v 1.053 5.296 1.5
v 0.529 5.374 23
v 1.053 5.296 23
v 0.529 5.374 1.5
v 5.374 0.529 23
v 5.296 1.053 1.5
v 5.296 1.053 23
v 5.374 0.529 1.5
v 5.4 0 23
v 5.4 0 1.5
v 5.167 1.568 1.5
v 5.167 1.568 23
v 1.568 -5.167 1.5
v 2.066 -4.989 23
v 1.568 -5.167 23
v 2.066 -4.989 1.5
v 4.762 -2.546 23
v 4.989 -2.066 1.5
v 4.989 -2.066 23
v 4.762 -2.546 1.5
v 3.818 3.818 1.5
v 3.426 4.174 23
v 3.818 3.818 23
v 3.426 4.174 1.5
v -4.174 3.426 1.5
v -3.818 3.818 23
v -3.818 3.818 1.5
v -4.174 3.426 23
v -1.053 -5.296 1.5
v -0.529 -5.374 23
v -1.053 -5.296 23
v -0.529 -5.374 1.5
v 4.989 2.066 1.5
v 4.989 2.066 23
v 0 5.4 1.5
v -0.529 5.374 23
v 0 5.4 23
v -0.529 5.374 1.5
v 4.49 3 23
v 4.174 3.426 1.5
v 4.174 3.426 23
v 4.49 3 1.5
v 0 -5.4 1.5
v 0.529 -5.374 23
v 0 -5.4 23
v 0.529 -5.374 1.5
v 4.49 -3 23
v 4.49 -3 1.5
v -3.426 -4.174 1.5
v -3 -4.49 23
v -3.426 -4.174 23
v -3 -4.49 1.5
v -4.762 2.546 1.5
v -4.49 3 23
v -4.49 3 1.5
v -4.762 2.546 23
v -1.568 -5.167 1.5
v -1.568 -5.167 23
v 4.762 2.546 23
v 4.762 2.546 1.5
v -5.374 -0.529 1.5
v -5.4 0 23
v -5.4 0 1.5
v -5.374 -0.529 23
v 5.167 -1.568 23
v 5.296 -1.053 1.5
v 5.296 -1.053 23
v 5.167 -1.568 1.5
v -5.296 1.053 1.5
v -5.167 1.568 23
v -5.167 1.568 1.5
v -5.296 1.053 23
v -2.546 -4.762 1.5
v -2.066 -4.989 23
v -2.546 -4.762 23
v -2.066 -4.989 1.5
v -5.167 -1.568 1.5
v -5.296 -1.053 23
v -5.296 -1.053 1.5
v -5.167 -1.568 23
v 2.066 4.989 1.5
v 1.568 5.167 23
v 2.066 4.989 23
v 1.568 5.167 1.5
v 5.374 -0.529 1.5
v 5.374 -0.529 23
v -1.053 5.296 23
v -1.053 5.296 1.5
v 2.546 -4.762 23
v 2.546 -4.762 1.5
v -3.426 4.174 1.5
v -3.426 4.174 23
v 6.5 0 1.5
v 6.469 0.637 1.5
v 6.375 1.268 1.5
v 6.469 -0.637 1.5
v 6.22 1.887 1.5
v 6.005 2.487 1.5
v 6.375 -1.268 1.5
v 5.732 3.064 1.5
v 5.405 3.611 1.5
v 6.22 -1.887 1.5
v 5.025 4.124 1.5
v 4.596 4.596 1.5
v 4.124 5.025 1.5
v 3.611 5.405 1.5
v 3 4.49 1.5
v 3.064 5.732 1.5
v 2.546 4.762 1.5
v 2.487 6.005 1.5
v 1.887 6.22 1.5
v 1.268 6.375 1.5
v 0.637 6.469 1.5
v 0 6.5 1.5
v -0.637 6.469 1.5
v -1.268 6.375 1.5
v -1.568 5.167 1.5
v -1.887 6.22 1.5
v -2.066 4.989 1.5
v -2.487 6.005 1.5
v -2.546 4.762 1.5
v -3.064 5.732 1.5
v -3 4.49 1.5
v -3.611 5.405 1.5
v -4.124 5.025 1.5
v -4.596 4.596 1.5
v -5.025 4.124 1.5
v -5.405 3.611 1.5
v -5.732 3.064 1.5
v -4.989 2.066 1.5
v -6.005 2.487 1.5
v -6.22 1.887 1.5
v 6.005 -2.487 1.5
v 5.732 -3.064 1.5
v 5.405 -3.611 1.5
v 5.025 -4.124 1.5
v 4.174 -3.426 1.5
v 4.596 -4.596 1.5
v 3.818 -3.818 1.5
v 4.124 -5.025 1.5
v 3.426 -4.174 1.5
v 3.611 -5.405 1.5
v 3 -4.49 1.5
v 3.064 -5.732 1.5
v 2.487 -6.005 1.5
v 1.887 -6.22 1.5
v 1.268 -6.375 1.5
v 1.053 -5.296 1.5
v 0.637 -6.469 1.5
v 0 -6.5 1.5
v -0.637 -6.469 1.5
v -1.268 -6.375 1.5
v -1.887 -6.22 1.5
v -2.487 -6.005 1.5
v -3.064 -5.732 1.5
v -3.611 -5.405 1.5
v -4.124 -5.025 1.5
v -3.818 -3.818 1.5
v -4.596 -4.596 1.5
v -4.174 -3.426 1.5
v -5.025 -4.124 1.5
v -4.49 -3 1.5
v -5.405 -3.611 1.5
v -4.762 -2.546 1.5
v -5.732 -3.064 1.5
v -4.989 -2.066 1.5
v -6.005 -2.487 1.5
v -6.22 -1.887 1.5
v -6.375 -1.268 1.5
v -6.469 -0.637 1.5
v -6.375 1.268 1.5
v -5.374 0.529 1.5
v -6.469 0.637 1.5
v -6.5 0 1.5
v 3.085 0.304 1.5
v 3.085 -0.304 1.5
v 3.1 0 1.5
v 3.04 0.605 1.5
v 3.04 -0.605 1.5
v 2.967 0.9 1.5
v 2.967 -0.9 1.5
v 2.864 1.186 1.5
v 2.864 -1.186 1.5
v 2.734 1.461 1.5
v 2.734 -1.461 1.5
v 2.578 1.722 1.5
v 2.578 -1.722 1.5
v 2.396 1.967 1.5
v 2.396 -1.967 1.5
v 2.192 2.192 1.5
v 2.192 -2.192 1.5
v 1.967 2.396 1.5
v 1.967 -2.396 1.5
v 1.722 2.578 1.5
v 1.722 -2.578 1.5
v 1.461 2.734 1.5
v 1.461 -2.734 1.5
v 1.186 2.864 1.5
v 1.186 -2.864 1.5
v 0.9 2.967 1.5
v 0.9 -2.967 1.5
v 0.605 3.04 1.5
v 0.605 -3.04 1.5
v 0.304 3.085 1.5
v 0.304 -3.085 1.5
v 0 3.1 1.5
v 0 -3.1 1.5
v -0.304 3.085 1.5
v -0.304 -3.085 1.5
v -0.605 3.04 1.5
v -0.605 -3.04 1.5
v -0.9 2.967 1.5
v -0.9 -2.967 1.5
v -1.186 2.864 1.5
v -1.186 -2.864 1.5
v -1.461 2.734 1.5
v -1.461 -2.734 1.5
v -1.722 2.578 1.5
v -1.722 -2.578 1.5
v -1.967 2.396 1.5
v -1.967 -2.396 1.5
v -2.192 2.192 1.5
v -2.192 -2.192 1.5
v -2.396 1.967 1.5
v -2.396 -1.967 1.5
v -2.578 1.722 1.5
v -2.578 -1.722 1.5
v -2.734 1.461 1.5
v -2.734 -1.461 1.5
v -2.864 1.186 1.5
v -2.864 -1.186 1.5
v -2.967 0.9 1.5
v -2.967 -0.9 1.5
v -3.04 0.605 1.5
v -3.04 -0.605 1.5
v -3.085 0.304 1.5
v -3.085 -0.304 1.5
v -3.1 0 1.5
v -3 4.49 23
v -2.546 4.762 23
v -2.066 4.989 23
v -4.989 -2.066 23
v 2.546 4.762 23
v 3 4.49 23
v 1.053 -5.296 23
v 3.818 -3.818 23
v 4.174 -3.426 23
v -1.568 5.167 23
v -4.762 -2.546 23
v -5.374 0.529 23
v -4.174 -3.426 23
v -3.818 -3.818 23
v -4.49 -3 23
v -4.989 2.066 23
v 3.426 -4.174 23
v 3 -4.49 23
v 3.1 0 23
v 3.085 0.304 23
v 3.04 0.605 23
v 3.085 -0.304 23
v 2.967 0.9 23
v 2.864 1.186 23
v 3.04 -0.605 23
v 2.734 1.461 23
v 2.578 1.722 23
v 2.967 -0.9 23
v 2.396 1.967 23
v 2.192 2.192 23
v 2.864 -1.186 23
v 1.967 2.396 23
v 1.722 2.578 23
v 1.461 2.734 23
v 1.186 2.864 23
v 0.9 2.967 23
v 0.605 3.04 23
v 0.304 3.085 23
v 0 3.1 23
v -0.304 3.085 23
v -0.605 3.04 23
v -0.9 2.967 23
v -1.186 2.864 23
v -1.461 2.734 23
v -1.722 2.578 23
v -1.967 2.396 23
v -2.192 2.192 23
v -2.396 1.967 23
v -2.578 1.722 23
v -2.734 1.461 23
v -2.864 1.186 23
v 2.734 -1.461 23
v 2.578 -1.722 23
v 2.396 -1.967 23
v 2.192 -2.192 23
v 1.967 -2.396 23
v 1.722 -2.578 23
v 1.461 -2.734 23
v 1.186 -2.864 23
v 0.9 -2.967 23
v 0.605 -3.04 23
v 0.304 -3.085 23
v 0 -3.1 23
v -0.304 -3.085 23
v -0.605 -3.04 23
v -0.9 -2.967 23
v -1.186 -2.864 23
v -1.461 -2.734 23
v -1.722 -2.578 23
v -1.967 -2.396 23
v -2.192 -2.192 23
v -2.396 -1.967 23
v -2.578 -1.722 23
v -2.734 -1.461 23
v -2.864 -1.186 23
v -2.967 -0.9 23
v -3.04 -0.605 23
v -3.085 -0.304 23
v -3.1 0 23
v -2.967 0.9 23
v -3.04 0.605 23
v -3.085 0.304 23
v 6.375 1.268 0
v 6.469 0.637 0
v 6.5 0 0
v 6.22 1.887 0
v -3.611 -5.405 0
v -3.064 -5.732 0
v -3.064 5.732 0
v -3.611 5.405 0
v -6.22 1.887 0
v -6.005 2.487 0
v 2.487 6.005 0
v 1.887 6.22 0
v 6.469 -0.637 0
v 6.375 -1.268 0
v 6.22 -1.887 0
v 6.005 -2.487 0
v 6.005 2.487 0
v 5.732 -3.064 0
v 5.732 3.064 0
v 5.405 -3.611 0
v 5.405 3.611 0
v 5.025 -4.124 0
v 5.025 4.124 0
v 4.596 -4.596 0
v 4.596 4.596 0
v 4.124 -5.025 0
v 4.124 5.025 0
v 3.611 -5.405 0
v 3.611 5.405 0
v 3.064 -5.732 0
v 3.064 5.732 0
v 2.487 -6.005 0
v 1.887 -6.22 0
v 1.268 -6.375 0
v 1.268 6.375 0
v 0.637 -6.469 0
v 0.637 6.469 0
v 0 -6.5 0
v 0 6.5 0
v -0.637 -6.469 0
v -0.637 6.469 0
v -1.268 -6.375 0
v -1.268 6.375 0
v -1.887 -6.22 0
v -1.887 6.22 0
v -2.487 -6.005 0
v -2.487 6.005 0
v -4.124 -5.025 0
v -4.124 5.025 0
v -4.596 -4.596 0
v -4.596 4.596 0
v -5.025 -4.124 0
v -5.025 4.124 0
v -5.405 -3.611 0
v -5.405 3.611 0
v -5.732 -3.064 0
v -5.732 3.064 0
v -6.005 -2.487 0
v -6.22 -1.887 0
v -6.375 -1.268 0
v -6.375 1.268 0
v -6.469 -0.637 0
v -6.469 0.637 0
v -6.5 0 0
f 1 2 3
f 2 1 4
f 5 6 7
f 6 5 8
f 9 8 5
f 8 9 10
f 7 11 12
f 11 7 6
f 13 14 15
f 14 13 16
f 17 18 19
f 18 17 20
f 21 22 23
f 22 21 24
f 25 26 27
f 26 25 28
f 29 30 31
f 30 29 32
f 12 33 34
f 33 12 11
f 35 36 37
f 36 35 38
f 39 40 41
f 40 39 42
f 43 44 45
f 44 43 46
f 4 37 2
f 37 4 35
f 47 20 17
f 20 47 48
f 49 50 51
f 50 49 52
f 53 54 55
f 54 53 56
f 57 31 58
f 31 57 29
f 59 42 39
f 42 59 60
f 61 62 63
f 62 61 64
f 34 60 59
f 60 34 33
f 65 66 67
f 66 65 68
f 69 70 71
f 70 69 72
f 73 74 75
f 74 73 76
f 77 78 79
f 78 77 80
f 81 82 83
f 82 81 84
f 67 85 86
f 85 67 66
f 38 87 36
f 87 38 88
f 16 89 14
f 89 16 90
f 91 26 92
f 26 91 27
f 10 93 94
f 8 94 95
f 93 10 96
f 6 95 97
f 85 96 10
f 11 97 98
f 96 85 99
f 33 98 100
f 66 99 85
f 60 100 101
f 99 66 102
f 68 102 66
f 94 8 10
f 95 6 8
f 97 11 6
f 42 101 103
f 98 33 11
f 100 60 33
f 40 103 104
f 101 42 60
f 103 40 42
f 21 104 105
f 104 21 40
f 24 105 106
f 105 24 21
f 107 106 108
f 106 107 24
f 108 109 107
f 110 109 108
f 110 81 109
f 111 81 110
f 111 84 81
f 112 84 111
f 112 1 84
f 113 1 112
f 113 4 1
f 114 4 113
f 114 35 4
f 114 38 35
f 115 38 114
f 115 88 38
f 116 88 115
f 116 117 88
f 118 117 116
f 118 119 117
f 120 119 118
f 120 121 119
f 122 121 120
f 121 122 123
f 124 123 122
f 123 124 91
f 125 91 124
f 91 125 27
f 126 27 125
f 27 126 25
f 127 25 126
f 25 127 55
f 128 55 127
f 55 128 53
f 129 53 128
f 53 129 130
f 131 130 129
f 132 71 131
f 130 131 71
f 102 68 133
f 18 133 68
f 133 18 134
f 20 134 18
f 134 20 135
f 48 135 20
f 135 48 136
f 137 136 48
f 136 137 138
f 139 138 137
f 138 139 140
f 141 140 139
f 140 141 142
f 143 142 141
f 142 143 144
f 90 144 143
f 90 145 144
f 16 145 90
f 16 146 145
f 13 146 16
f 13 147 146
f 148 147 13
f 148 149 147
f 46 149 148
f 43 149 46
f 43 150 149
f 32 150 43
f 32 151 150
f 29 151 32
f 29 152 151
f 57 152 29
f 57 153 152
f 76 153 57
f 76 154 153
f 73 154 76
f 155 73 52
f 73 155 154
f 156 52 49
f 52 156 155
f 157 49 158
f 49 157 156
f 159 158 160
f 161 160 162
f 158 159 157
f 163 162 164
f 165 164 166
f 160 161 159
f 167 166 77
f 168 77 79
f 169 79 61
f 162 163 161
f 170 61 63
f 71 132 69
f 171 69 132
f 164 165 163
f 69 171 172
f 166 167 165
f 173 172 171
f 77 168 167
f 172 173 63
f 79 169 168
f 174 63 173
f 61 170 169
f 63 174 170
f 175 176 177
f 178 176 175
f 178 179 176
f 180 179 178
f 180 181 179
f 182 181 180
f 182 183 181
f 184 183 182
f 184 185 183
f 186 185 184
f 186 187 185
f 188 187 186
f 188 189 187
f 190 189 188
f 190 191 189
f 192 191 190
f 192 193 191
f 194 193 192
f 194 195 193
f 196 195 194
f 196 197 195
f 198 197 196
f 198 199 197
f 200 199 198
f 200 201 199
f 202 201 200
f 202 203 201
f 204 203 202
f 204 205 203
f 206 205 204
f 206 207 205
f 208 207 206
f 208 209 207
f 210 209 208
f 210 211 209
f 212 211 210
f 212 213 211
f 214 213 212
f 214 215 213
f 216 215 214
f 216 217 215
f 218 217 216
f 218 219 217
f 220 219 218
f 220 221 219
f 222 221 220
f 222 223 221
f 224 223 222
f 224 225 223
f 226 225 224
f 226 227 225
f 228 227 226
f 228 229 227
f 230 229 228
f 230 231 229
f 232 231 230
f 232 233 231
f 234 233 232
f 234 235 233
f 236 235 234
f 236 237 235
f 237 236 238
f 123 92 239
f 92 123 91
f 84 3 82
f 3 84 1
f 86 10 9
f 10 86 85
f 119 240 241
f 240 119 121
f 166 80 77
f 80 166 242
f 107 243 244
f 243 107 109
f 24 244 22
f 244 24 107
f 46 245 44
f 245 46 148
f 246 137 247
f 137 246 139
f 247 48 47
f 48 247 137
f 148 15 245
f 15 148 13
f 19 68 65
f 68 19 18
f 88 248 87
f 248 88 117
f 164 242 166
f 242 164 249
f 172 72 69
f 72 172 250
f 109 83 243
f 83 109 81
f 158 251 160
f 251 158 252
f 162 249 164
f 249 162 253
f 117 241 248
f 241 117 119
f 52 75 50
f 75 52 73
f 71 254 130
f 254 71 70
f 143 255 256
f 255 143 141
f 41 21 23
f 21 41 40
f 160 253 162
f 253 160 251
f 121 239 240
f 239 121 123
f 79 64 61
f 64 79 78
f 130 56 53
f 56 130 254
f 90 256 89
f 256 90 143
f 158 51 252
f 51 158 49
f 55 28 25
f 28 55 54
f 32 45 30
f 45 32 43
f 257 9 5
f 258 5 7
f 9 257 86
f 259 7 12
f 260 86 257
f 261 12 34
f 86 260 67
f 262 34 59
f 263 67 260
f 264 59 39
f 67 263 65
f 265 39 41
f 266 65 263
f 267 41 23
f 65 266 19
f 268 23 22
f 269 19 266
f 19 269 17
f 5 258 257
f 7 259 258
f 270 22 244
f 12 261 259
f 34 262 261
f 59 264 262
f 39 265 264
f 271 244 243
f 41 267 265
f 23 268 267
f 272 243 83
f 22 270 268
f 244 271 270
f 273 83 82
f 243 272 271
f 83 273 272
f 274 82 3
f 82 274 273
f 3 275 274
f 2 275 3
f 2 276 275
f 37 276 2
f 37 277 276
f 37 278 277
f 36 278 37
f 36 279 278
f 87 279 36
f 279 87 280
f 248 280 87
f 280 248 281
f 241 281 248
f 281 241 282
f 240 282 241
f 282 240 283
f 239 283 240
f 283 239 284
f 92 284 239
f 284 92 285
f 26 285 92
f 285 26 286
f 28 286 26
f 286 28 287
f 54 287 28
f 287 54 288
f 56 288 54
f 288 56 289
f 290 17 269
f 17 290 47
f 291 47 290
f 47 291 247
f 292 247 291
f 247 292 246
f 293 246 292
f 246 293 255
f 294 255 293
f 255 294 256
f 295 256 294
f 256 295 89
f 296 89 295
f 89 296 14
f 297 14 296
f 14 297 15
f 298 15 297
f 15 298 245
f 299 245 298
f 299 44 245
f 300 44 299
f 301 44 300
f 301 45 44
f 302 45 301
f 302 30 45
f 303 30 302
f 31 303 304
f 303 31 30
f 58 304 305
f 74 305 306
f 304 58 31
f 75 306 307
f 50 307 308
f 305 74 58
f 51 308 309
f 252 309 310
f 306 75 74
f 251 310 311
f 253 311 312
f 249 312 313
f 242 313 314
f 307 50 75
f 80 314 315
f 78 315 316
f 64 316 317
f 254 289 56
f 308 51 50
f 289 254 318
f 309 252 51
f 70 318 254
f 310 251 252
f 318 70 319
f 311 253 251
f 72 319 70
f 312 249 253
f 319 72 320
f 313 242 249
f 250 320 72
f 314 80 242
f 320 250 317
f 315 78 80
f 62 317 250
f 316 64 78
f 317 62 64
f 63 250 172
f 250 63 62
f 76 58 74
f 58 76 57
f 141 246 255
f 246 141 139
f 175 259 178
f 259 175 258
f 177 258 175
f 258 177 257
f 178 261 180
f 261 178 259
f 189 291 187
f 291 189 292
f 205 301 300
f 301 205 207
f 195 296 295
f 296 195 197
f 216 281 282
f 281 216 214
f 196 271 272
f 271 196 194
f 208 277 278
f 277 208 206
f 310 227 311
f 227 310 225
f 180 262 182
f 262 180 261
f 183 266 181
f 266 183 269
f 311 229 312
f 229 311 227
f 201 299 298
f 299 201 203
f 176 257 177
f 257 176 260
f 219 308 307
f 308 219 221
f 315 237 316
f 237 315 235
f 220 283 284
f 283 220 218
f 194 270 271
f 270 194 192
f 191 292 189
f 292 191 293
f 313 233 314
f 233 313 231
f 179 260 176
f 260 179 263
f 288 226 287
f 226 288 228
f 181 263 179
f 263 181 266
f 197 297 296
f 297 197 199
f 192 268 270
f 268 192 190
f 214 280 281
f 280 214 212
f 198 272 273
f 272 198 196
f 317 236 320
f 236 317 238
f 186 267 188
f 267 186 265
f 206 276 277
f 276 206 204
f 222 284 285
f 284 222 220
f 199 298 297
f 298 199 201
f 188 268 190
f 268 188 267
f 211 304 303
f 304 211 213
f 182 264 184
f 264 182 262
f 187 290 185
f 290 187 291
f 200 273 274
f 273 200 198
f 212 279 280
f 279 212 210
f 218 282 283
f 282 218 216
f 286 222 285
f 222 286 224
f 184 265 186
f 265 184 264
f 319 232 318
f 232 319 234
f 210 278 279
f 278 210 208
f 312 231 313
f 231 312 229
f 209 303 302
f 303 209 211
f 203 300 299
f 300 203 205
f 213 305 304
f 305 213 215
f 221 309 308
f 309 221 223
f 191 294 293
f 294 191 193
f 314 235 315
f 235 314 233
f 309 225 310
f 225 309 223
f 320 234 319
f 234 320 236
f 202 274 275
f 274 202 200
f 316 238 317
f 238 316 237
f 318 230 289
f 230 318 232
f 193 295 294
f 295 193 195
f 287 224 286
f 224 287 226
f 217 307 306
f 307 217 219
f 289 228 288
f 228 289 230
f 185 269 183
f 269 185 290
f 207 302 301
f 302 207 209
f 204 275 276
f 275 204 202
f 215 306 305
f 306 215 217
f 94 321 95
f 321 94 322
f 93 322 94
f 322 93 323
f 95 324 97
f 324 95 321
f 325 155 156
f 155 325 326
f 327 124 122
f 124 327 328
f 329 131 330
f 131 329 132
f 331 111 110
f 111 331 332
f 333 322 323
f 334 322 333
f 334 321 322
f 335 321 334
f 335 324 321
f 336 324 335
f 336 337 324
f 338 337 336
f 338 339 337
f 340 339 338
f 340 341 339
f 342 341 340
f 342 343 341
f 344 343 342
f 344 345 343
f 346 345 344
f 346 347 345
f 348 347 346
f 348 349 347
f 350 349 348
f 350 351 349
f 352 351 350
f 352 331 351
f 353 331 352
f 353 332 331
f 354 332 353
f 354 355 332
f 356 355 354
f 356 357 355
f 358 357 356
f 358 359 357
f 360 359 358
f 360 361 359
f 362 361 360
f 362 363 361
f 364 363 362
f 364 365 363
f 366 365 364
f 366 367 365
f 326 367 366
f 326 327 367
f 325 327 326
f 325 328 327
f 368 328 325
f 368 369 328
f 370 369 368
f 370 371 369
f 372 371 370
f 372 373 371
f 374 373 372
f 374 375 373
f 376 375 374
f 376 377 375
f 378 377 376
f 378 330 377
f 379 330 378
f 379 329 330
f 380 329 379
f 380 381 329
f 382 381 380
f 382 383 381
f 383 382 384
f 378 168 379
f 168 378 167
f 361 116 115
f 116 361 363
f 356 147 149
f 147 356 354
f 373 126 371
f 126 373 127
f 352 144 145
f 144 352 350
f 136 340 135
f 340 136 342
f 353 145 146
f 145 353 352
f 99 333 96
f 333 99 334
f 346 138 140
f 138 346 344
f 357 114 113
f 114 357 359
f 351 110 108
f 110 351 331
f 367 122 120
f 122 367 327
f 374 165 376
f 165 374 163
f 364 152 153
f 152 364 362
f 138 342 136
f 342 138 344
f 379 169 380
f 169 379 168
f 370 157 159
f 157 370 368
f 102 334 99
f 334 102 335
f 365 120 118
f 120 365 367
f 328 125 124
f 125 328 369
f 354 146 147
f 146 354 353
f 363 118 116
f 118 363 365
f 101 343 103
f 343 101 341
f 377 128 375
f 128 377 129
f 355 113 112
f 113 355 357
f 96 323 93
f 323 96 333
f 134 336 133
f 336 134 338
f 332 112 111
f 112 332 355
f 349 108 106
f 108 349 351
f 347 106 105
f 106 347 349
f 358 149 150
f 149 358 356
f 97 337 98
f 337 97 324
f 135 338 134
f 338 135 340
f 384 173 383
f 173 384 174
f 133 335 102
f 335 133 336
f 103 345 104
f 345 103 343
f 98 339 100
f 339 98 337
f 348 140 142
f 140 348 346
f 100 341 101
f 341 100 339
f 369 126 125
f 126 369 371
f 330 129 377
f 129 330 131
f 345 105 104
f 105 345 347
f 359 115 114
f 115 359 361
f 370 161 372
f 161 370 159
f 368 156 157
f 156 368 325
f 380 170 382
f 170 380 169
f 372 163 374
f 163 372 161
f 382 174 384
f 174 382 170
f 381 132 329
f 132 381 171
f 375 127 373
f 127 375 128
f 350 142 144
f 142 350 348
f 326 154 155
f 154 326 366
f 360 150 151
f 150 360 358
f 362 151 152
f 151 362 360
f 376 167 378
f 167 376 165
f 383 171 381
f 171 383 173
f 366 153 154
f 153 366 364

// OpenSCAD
// Dimensions for the PCR tube adapter sleeve

// Collar dimensions
collar_diameter = 13;  // Diameter of the collar in mm
collar_thickness = 1.5; // Thickness of the collar in mm

// Sleeve body dimensions
sleeve_outer_diameter = 10.8; // Outer diameter of the sleeve body in mm
sleeve_height = 21.5;         // Total height of the sleeve body (from z=1.5 to z=21.5)

// Bore dimensions
bore_diameter = 6.2;       // Diameter of the central bore in mm

// Positioning and tolerances
collar_z_top = collar_thickness; // Collar sits from z=0 to z=1.5 (assuming it rests on the bed at z=0, but the description implies a specific Z range)
sleeve_bottom_z = collar_thickness; // Sleeve starts where the collar ends (at z=1.5)
sleeve_top_z = sleeve_bottom_z + sleeve_height; // Total height calculation

// --- 1. Collar ---
module adapter_collar() {
    cylinder(h = collar_thickness, r = collar_diameter / 2, $fn = 64);
}

// --- 2. Sleeve Body ---
module adapter_sleeve() {
    difference() {
        // Outer shape of the sleeve body (a cylinder)
        cylinder(h = sleeve_height, r = sleeve_outer_diameter / 2, $fn = 64);

        // Inner bore (cutout)
        translate([0, 0, -1]) { // Translate slightly below to ensure full cut through the body
            cylinder(h = sleeve_height + 2, r = bore_diameter / 2, $fn = 64);
        }
    }
}

// --- Assembly ---

// Place the collar at the bottom (z=0 to z=1.5)
translate([0, 0, 0]) {
    adapter_collar();
}

// Place the sleeve body starting from where the collar ends (z=1.5)
translate([0, 0, sleeve_bottom_z]) {
    adapter_sleeve();
}
